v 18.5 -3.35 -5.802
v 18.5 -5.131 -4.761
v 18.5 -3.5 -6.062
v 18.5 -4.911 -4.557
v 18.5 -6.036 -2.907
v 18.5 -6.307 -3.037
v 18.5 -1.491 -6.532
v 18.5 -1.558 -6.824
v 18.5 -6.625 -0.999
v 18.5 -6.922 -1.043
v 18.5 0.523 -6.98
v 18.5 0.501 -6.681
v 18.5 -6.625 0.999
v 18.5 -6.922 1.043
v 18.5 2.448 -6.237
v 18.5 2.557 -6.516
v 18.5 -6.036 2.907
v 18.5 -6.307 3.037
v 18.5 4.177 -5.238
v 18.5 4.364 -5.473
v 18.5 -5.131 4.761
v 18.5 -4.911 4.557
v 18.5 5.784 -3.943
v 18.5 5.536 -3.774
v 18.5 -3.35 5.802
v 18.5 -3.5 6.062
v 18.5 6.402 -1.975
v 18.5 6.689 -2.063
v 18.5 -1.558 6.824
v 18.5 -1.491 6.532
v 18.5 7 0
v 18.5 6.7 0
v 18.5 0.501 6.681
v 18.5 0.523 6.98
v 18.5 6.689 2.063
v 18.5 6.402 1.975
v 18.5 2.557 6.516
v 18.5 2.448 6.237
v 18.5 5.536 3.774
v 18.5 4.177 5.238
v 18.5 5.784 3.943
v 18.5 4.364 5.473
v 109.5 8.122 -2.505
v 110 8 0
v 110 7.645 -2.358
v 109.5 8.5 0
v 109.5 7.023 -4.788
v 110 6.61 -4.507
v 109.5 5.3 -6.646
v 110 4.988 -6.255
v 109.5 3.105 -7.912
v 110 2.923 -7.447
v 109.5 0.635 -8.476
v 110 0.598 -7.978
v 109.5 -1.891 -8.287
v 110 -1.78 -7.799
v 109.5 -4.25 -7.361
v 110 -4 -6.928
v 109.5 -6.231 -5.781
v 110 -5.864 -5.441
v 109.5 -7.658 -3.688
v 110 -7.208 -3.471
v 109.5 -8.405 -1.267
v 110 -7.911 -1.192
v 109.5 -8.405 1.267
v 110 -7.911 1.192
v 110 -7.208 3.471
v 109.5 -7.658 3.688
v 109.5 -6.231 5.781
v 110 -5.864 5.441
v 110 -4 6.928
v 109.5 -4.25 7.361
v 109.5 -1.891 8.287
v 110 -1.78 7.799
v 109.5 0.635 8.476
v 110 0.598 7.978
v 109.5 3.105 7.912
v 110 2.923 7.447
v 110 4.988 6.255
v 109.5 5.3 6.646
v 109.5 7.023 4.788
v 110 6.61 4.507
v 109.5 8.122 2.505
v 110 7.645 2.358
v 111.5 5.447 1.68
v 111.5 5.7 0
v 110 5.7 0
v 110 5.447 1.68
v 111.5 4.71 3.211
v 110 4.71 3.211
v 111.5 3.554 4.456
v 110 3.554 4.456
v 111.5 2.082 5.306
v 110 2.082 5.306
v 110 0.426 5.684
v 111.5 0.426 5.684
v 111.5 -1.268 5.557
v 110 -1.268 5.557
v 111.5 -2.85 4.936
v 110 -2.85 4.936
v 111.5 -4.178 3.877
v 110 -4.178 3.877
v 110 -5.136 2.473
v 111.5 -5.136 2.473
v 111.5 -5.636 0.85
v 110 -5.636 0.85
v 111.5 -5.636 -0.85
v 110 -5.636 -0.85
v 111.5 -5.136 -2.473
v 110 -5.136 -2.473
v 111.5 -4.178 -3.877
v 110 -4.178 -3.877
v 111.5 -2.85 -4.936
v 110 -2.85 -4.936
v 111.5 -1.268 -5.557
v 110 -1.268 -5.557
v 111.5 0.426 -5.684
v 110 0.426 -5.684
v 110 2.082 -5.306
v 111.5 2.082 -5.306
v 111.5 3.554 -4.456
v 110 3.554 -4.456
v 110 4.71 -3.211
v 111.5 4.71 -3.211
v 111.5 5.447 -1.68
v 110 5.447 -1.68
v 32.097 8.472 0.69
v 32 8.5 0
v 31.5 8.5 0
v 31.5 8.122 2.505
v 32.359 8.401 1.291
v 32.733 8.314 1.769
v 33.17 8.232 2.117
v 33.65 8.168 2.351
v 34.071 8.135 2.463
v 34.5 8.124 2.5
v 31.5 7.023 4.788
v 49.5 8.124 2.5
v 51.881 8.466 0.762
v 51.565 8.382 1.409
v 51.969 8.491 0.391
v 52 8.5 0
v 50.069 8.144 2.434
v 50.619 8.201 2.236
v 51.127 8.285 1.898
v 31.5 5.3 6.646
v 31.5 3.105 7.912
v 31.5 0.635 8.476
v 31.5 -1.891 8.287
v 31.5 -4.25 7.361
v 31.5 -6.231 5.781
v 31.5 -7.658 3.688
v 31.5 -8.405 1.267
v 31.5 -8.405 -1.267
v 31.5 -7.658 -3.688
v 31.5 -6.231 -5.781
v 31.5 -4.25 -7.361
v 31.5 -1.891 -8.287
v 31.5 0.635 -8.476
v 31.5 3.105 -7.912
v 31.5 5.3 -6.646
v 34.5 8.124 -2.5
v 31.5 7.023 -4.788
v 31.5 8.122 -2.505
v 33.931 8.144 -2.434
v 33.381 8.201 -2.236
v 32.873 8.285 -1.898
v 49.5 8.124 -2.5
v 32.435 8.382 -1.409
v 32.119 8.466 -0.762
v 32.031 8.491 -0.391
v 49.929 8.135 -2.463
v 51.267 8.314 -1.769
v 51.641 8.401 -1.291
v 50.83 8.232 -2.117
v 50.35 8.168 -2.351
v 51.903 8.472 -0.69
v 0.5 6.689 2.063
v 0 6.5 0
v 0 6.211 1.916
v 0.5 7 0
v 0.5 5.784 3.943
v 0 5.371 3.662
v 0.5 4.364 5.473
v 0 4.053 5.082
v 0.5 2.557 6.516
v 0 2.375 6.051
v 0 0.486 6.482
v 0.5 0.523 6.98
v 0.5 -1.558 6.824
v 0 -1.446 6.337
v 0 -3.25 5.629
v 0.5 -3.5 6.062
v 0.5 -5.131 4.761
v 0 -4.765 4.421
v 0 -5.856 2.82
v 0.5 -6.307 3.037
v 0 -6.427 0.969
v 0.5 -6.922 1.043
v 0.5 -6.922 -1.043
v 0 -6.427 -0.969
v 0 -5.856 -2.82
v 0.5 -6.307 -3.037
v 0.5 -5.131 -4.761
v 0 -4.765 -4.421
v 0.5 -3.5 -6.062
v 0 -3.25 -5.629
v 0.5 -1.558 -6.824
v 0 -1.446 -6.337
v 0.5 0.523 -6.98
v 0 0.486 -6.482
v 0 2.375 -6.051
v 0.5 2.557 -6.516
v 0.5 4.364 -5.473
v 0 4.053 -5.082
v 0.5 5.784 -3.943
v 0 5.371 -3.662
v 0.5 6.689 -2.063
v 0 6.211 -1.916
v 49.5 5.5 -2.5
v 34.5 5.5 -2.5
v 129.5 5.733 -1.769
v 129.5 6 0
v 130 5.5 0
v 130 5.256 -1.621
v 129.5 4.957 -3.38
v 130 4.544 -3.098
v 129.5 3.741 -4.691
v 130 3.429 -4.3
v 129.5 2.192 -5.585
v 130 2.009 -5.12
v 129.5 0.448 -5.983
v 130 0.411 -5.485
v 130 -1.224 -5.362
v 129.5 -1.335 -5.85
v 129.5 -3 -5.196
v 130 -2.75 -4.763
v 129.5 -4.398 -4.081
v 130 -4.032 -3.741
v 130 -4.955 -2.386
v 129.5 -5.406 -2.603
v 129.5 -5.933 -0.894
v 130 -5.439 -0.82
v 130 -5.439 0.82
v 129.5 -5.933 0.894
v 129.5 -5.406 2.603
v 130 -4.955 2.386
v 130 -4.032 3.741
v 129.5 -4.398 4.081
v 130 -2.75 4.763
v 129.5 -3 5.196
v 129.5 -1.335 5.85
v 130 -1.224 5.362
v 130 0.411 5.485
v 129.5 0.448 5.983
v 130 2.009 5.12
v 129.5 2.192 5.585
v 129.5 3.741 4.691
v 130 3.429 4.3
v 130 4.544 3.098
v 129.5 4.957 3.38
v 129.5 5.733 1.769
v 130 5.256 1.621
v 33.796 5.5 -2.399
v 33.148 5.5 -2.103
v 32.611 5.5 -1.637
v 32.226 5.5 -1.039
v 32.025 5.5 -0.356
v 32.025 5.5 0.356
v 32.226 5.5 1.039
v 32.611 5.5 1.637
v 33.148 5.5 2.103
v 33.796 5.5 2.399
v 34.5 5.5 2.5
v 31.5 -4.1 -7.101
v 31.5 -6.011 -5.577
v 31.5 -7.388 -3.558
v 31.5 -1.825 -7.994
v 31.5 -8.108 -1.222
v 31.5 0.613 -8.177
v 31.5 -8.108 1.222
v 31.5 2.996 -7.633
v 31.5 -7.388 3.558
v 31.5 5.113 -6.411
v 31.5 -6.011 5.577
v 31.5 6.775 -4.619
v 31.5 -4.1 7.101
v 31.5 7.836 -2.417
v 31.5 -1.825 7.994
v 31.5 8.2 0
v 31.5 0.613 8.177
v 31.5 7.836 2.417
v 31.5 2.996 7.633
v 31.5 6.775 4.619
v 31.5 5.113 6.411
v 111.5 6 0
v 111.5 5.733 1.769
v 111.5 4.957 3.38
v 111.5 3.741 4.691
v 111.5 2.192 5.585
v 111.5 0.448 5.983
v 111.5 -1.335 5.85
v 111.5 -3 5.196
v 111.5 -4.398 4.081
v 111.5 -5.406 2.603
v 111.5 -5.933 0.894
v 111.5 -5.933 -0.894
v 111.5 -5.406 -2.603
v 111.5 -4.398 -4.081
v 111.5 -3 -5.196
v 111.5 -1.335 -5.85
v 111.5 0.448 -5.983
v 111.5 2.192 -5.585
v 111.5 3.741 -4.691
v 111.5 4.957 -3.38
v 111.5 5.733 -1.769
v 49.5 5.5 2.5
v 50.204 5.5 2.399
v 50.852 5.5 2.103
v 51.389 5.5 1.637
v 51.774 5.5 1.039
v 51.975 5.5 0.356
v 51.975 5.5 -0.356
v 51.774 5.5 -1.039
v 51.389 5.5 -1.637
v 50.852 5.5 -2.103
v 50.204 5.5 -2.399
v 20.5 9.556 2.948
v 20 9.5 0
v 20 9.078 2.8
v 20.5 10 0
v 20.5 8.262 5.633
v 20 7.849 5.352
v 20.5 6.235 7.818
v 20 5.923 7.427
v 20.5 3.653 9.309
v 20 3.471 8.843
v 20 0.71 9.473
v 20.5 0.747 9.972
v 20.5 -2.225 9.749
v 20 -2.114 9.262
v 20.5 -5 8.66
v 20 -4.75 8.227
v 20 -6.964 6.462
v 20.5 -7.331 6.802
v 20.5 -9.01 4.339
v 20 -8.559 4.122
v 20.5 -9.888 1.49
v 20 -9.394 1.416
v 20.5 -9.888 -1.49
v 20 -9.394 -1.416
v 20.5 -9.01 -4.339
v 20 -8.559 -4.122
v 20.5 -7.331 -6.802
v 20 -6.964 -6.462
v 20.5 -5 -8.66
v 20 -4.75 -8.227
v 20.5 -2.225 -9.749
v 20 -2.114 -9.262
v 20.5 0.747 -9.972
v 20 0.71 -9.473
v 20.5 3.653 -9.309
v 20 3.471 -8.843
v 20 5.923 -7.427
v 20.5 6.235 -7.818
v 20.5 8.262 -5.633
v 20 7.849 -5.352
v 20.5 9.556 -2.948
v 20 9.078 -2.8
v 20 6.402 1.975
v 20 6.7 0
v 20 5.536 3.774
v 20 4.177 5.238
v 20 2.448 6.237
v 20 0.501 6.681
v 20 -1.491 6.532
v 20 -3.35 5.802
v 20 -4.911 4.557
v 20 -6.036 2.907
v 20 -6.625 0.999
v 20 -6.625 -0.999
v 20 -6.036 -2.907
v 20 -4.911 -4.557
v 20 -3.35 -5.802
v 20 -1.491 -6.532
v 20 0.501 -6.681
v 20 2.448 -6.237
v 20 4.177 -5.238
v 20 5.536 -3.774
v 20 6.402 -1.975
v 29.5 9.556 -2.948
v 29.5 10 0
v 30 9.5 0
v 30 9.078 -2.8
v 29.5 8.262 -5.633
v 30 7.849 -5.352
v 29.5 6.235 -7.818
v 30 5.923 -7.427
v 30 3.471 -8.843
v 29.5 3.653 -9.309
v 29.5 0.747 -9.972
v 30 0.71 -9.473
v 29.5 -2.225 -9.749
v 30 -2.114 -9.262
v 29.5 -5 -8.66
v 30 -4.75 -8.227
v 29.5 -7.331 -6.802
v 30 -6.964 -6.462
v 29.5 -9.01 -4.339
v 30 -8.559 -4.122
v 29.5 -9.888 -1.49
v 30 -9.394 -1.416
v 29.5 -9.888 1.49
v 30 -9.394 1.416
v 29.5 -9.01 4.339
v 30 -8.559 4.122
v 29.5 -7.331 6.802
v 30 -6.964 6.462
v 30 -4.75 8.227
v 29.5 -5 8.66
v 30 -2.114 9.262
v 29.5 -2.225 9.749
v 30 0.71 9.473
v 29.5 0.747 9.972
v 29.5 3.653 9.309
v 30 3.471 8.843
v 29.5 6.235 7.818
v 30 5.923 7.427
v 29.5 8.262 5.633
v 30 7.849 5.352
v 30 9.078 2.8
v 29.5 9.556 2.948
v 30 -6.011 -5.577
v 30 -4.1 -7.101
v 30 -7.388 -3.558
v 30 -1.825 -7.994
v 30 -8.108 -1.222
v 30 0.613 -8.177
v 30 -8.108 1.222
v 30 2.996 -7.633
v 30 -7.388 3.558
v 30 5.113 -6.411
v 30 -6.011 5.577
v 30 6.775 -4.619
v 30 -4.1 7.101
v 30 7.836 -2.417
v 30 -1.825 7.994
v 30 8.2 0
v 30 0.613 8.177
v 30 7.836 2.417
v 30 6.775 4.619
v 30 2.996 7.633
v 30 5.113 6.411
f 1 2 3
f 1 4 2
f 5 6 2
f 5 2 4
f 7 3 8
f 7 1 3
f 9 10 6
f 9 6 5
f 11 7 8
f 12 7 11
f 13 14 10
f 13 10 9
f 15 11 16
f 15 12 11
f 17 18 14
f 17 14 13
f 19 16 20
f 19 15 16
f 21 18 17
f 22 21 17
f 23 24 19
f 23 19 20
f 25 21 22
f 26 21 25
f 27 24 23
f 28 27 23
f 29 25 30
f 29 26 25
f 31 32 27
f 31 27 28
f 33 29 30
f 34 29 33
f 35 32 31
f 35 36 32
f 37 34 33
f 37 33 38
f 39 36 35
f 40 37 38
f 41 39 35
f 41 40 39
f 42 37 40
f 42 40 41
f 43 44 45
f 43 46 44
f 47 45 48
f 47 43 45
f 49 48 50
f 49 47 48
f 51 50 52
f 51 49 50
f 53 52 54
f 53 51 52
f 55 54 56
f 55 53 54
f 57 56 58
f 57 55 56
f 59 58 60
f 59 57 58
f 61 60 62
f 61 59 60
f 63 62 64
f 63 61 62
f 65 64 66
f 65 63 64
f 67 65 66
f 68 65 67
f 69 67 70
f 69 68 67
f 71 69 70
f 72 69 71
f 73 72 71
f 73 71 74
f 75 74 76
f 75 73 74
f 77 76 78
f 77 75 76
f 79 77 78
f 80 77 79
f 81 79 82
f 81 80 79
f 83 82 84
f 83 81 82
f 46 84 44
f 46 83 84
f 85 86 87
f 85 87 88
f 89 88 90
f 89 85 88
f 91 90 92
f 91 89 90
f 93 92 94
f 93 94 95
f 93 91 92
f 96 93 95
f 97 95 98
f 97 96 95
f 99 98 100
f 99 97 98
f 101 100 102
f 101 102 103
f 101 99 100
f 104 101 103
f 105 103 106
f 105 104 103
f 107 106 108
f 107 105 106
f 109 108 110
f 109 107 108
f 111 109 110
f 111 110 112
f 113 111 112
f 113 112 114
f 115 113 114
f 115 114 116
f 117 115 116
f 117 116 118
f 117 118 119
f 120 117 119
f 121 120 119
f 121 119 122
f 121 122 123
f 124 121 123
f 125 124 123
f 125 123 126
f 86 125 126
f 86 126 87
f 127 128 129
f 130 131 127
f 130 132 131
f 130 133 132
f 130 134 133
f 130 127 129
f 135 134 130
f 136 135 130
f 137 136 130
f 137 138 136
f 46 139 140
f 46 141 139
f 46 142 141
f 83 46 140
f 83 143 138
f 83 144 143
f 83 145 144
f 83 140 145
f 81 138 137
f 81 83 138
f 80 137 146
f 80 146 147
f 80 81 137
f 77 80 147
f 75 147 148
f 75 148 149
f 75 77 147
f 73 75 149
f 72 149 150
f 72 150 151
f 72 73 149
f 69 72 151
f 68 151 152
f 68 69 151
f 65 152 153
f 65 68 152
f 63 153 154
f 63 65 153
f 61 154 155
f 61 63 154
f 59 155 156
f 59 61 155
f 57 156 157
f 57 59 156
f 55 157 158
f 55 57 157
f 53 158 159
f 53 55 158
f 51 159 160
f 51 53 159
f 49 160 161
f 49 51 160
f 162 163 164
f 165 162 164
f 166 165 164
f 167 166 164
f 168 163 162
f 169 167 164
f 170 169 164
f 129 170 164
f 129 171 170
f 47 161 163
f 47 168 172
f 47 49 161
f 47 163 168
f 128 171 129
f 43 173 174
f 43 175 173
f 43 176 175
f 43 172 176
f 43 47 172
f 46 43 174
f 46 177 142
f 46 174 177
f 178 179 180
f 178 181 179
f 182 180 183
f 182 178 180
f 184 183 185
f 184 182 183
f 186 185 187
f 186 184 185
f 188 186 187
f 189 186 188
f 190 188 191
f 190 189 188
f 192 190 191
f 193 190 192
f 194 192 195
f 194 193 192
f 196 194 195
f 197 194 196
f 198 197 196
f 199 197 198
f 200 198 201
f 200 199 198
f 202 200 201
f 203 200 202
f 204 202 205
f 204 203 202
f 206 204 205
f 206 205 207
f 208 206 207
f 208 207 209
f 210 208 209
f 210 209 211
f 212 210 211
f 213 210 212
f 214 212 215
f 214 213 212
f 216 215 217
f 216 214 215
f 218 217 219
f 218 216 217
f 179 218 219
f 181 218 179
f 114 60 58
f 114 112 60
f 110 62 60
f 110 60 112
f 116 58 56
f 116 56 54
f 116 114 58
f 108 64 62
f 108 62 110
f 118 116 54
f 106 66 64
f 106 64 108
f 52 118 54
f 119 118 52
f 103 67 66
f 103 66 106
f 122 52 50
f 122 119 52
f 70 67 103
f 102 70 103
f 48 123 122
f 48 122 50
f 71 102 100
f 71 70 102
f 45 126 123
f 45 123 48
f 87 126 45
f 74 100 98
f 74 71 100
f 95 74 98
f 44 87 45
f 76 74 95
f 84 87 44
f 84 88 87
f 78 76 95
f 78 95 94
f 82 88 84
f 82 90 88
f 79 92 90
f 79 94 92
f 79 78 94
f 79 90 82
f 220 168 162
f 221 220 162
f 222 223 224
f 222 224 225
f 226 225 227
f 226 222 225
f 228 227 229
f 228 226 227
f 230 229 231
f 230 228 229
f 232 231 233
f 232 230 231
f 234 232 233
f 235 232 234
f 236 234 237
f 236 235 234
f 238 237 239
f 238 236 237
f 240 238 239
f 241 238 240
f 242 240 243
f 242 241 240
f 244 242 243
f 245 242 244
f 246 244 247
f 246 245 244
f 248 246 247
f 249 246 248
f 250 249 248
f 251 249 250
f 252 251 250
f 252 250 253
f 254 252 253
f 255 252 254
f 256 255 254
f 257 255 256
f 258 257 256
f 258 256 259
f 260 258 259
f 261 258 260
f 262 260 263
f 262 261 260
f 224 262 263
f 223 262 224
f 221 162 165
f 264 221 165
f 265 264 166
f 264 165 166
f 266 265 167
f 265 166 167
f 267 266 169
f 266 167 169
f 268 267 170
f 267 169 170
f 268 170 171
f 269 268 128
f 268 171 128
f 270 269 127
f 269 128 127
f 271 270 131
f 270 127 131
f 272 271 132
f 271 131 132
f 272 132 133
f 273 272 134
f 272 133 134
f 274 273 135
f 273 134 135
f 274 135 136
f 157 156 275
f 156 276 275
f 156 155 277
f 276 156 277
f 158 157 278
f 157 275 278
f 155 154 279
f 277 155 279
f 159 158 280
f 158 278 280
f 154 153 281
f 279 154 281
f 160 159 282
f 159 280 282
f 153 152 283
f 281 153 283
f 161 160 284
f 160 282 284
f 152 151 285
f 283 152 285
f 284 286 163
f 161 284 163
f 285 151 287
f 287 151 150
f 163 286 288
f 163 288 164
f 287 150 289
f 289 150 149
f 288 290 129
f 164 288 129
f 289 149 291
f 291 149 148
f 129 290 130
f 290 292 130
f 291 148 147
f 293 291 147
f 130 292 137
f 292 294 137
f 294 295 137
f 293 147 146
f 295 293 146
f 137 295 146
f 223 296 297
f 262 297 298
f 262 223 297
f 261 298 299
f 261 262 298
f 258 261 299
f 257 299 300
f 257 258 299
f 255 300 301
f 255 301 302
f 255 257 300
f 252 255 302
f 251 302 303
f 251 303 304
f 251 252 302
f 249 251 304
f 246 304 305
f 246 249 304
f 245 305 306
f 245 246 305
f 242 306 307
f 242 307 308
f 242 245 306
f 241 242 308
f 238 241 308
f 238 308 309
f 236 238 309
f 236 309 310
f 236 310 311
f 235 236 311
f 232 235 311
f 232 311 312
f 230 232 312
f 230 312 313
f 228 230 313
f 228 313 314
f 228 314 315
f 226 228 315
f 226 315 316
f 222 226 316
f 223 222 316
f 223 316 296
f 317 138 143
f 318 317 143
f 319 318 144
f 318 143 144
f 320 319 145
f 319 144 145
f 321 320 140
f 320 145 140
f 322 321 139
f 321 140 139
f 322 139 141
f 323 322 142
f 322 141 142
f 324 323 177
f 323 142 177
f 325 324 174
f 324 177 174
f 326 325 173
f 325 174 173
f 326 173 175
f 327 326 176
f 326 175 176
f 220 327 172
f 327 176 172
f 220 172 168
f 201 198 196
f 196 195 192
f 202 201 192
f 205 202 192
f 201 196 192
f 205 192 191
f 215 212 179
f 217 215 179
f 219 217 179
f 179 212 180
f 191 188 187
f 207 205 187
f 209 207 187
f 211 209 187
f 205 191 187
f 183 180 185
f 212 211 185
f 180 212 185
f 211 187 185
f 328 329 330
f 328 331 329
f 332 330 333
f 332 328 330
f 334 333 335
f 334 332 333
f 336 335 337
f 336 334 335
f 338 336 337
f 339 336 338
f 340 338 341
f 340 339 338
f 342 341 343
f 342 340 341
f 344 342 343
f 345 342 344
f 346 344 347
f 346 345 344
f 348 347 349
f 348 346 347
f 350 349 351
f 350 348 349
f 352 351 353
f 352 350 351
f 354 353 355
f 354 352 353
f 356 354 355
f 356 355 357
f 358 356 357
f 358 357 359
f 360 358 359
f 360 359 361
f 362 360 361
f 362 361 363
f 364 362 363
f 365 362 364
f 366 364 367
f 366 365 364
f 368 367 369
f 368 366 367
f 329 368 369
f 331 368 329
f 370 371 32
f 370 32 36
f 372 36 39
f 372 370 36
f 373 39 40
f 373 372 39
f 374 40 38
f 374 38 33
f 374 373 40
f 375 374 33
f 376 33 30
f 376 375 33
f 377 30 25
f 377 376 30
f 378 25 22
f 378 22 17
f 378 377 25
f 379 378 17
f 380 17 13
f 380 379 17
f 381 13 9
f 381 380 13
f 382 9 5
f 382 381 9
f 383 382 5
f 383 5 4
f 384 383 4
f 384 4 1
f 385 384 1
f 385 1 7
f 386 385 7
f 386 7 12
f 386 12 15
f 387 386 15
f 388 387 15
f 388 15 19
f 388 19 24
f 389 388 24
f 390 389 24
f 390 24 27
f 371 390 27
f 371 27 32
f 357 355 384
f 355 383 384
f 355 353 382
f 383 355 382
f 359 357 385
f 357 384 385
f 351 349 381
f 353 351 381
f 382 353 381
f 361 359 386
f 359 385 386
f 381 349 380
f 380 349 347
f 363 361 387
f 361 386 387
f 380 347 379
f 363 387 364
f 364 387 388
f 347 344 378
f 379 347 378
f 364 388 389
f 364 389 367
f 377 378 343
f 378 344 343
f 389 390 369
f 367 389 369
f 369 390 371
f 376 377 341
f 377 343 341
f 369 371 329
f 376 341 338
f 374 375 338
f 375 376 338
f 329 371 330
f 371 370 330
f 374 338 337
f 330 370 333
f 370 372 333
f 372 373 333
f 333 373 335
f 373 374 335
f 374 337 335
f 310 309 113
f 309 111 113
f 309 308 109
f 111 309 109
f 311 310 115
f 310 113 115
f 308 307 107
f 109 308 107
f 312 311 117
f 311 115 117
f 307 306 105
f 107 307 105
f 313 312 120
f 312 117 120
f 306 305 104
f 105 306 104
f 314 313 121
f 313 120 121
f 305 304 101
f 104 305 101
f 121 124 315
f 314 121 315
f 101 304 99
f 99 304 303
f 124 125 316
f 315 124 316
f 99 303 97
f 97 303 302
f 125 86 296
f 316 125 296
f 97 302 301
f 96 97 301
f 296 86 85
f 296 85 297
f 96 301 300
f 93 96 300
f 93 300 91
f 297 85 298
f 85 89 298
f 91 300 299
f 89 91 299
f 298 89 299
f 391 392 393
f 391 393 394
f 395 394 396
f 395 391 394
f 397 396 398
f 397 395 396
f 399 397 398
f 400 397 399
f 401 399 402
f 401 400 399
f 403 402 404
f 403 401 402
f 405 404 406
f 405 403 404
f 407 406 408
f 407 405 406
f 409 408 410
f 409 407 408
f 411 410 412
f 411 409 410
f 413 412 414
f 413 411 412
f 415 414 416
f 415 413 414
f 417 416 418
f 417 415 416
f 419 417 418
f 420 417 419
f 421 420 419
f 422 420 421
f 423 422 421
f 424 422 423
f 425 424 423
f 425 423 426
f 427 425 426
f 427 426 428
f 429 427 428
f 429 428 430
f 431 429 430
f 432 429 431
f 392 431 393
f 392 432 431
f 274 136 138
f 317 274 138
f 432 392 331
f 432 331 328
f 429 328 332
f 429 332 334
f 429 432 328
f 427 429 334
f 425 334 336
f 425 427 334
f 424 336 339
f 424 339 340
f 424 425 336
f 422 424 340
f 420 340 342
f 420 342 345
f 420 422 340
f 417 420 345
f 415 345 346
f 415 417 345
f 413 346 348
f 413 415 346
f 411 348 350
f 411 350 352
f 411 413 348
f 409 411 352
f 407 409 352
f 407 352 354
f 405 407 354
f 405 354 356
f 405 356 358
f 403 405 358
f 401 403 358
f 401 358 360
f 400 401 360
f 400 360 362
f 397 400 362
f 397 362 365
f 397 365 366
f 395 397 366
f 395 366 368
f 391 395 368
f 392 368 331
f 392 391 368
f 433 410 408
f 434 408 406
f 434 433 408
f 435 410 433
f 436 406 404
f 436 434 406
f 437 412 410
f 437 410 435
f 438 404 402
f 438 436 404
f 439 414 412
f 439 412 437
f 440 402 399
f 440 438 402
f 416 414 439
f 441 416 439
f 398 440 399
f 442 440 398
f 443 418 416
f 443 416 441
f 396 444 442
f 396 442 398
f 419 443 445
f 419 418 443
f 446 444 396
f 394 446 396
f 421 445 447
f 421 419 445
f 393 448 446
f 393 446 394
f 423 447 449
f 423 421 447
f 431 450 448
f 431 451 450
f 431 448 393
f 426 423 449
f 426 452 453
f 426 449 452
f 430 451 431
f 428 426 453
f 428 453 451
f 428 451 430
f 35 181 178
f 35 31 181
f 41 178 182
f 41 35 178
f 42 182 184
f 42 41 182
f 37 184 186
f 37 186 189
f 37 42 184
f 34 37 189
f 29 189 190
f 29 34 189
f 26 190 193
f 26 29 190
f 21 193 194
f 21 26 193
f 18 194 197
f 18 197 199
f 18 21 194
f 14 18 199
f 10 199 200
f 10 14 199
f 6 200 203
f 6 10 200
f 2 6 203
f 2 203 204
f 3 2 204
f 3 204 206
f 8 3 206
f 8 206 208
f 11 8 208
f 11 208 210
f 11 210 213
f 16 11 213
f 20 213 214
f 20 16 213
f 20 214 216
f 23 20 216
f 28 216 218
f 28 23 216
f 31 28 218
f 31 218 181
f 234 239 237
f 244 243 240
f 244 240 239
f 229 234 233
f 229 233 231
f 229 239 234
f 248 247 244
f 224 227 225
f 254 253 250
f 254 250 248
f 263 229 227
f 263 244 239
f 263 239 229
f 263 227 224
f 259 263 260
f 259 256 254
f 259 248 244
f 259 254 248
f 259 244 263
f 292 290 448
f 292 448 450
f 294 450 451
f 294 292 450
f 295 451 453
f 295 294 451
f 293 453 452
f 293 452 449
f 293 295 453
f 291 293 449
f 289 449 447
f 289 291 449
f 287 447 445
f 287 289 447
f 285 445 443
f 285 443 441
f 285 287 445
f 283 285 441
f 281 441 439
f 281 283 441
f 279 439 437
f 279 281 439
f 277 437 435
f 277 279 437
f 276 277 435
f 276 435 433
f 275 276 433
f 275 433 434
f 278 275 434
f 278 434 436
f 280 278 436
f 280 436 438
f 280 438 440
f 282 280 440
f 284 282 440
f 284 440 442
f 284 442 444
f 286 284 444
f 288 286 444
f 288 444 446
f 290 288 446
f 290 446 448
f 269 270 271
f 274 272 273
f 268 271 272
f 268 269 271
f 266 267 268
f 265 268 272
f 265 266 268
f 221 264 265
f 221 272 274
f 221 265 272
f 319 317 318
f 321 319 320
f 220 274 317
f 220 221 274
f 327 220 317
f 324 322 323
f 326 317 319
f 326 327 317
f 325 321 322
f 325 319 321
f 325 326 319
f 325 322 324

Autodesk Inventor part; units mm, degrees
ref_plane "YZ Plane" through (0, 0, 0) normal (1, 0, 0) x (0, 1, 0)
ref_plane "XZ Plane" through (0, 0, 0) normal (0, 1, 0) x (-1, 0, 0)
ref_plane "XY Plane" through (0, 0, 0) normal (0, 0, 1) x (1, 0, 0)
sketch "Sketch_1" plane through (0, 0, 0) normal (0, 0, 1) x (1, 0, 0)
  line L0 (130, 0) -> (0, 0)
  line L1 (0, 0) -> (0, 6.5)
  line L2 (0, 6.5) -> (0.5, 7)
  line L3 (0.5, 7) -> (20, 7)
  line L4 (20, 7) -> (20, 9.5)
  line L5 (20, 9.5) -> (20.5, 10)
  line L6 (20.5, 10) -> (29.5, 10)
  line L7 (29.5, 10) -> (30, 9.5)
  line L8 (30, 9.5) -> (30, 8.5)
  line L9 (30, 8.5) -> (109.5, 8.5)
  line L10 (109.5, 8.5) -> (110, 8)
  line L11 (110, 8) -> (110, 6)
  line L12 (110, 6) -> (129.5, 6)
  line L13 (129.5, 6) -> (130, 5.5)
  line L14 (130, 5.5) -> (130, 0)
  line L15 (130, 0) -> (0, 0)
revolve "Revolution1" add sketch "Sketch_1" angle 360 about axis through (130, 0, 0) along (1, 0, 0)
sketch "Sketch_2" plane through (0, 0, 0) normal (0, 0, 1) x (1, 0, 0)
  line L0 (50, 0) -> (-50, 0)
  line L1 (18.5, 6.7) -> (20, 6.7)
  line L2 (20, 6.7) -> (20, 20.7)
  line L3 (20, 20.7) -> (18.5, 20.7)
  line L4 (18.5, 20.7) -> (18.5, 6.7)
revolve "Revolution2" cut sketch "Sketch_2" angle 360 about axis through (50, 0, 0) along (1, 0, 0)
sketch "Sketch_3" plane through (0, 0, 0) normal (0, 0, 1) x (1, 0, 0)
  line L0 (260, 0) -> (-260, 0)
  line L1 (30, 8.2) -> (31.5, 8.2)
  line L2 (31.5, 8.2) -> (31.5, 22.2)
  line L3 (31.5, 22.2) -> (30, 22.2)
  line L4 (30, 22.2) -> (30, 8.2)
revolve "Revolution3" cut sketch "Sketch_3" angle 360 about axis through (260, 0, 0) along (1, 0, 0)
sketch "Sketch_4" plane through (0, 0, 0) normal (0, 0, 1) x (1, 0, 0)
  line L0 (50, 0) -> (-50, 0)
  line L1 (110, 5.7) -> (111.5, 5.7)
  line L2 (111.5, 5.7) -> (111.5, 19.7)
  line L3 (111.5, 19.7) -> (110, 19.7)
  line L4 (110, 19.7) -> (110, 5.7)
revolve "Revolution4" cut sketch "Sketch_4" angle 360 about axis through (50, 0, 0) along (1, 0, 0)
sketch "Sketch_15" plane through (0, 8.5, 0) normal (0, 1, 0) x (1, 0, 0)
  arc A0 (34.5, 2.5) -> (34.5, -2.5) centre (34.5, 0) ccw
  line L0 (34.5, -2.5) -> (49.5, -2.5)
  arc A1 (49.5, -2.5) -> (49.5, 2.5) centre (49.5, 0) ccw
  line L1 (49.5, 2.5) -> (34.5, 2.5)
extrude "Extrusion1" cut sketch "Sketch_15" against normal blind 3
properties part number "KZFC17-130-T10-P14-LA20-Q12-LB20-KC58-HC20_b"
